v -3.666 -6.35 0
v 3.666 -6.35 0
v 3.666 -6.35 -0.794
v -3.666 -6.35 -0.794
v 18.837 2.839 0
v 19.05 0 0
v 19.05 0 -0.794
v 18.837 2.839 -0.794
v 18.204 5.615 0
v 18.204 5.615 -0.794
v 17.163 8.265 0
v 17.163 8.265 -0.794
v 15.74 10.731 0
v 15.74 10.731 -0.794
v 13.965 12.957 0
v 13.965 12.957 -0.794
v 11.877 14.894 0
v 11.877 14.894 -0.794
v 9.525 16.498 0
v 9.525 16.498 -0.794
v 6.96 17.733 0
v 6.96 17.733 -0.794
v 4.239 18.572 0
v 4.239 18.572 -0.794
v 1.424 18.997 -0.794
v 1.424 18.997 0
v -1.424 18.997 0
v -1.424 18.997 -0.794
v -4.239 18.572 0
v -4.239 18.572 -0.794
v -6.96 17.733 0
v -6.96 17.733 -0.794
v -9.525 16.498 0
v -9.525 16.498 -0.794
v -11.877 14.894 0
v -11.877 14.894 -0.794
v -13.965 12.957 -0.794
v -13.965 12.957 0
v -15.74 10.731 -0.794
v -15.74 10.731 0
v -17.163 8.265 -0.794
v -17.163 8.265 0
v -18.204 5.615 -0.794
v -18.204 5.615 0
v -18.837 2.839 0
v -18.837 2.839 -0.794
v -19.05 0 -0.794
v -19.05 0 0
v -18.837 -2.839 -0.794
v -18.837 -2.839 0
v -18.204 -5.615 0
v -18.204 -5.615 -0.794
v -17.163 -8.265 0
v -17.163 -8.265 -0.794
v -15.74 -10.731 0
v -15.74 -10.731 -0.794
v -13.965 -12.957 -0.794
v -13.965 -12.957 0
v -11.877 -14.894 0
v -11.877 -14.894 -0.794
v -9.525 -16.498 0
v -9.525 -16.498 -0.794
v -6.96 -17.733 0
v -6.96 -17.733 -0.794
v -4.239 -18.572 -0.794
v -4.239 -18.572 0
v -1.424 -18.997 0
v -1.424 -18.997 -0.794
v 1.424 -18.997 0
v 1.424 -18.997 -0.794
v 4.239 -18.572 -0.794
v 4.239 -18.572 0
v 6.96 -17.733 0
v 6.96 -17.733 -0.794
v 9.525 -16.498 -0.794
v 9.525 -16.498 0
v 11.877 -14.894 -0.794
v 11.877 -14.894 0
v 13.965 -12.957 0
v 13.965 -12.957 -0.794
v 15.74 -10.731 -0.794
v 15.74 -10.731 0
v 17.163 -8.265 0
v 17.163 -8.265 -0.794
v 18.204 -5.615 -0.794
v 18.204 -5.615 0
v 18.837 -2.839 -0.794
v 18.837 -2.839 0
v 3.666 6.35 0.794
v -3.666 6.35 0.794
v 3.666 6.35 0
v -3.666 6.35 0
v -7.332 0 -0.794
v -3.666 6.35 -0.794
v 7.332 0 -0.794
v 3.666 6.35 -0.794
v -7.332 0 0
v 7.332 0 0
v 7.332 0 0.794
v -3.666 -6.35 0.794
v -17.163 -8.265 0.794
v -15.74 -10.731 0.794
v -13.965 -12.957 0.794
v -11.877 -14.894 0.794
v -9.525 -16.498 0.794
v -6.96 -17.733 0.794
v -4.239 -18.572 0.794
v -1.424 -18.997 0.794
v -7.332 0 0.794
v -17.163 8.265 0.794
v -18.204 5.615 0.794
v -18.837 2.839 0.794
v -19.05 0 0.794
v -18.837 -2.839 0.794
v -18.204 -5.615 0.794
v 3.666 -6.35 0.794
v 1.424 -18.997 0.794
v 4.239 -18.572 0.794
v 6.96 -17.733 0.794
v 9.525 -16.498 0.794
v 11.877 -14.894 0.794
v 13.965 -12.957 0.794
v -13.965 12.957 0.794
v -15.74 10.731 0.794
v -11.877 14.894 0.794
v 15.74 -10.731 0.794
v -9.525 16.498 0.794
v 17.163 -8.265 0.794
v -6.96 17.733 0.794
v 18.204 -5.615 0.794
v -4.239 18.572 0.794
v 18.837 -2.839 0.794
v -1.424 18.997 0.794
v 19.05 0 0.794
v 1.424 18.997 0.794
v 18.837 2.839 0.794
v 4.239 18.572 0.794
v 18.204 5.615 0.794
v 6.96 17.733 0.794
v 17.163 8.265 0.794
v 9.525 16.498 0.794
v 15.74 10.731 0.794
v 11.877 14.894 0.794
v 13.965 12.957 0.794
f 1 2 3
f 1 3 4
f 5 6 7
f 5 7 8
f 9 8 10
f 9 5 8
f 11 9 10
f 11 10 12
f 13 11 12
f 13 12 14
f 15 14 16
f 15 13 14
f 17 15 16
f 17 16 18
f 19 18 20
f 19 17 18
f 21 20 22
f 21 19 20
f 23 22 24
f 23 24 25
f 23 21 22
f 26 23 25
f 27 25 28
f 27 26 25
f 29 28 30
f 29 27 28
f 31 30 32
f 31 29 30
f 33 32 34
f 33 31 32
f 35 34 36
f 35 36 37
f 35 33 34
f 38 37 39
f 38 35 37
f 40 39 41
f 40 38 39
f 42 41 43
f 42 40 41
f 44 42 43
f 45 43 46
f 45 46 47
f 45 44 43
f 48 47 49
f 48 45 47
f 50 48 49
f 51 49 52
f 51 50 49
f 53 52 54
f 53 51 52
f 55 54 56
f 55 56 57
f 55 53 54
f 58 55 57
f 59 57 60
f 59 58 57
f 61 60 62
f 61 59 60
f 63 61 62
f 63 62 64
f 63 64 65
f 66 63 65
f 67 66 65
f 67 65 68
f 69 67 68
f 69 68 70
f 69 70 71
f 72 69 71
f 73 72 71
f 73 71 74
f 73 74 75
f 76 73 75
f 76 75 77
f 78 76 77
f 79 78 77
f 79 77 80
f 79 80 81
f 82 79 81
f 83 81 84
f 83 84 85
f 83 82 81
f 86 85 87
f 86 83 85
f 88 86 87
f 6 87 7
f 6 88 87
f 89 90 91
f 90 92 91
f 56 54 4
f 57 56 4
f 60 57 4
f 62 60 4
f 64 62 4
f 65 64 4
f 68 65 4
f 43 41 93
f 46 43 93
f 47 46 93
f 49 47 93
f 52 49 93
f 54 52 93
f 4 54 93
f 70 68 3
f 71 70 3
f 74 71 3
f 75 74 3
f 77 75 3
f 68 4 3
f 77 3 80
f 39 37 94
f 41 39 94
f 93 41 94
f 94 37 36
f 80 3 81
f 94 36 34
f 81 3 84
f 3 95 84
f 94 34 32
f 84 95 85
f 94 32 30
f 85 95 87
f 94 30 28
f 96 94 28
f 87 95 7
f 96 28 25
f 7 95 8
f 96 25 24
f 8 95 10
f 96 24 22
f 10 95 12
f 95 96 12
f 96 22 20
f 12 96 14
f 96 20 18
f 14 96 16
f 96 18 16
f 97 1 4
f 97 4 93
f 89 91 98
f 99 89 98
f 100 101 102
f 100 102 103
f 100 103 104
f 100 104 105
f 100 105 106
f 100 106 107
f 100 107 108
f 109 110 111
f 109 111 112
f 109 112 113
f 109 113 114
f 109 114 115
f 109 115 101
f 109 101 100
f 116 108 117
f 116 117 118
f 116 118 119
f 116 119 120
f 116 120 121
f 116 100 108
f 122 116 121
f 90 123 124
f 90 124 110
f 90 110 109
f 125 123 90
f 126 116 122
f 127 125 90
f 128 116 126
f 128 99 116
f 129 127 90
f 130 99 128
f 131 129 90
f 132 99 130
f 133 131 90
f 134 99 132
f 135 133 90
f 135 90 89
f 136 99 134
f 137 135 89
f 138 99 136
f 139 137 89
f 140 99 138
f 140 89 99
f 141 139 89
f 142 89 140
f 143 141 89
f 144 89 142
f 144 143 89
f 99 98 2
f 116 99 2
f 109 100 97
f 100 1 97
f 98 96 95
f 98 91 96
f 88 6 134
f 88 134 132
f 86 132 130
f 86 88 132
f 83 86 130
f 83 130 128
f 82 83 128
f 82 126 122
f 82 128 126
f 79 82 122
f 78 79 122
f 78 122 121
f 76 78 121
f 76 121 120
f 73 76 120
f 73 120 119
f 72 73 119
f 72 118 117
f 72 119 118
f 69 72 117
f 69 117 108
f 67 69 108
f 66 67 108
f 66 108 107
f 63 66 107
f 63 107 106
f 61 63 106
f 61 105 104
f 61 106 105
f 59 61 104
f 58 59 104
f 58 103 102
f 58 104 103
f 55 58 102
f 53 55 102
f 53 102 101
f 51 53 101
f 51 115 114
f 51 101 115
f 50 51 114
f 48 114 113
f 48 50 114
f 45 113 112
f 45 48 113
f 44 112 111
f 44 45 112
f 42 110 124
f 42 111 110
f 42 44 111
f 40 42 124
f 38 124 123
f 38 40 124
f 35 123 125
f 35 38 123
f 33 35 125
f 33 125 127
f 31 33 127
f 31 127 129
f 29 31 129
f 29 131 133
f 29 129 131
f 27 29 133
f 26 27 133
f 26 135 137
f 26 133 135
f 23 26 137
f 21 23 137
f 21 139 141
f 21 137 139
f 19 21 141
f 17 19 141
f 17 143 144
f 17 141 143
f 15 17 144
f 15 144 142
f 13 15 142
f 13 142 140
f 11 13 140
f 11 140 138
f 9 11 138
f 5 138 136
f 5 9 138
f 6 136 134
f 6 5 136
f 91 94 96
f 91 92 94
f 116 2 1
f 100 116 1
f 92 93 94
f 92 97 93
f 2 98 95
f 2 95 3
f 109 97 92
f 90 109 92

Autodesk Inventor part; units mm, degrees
ref_plane "YZ Plane" through (0, 0, 0) normal (1, 0, 0) x (0, 1, 0)
ref_plane "XZ Plane" through (0, 0, 0) normal (0, 1, 0) x (-1, 0, 0)
ref_plane "XY Plane" through (0, 0, 0) normal (0, 0, 1) x (1, 0, 0)
sketch "Sketch1" plane through (0, 0, 0) normal (0, 0, 1) x (1, 0, 0)
  line L0 (3.6662, 6.35) -> (7.3323, 0)
  line L1 (7.3323, 0) -> (3.6662, -6.35)
  line L2 (3.6662, -6.35) -> (-3.6662, -6.35)
  line L3 (-3.6662, -6.35) -> (-7.3323, 0)
  line L4 (-7.3323, 0) -> (-3.6662, 6.35)
  line L5 (-3.6662, 6.35) -> (3.6662, 6.35)
  circle A0 centre (0, 0) radius 19.05
  dimension "d0" = 12.7
  dimension "d1" = 38.1
extrude "Extrusion1" add sketch "Sketch1" along normal mid plane 1.5875
properties part number "SPACER,HEX,INTAKE" material "Nylon 6/6"
